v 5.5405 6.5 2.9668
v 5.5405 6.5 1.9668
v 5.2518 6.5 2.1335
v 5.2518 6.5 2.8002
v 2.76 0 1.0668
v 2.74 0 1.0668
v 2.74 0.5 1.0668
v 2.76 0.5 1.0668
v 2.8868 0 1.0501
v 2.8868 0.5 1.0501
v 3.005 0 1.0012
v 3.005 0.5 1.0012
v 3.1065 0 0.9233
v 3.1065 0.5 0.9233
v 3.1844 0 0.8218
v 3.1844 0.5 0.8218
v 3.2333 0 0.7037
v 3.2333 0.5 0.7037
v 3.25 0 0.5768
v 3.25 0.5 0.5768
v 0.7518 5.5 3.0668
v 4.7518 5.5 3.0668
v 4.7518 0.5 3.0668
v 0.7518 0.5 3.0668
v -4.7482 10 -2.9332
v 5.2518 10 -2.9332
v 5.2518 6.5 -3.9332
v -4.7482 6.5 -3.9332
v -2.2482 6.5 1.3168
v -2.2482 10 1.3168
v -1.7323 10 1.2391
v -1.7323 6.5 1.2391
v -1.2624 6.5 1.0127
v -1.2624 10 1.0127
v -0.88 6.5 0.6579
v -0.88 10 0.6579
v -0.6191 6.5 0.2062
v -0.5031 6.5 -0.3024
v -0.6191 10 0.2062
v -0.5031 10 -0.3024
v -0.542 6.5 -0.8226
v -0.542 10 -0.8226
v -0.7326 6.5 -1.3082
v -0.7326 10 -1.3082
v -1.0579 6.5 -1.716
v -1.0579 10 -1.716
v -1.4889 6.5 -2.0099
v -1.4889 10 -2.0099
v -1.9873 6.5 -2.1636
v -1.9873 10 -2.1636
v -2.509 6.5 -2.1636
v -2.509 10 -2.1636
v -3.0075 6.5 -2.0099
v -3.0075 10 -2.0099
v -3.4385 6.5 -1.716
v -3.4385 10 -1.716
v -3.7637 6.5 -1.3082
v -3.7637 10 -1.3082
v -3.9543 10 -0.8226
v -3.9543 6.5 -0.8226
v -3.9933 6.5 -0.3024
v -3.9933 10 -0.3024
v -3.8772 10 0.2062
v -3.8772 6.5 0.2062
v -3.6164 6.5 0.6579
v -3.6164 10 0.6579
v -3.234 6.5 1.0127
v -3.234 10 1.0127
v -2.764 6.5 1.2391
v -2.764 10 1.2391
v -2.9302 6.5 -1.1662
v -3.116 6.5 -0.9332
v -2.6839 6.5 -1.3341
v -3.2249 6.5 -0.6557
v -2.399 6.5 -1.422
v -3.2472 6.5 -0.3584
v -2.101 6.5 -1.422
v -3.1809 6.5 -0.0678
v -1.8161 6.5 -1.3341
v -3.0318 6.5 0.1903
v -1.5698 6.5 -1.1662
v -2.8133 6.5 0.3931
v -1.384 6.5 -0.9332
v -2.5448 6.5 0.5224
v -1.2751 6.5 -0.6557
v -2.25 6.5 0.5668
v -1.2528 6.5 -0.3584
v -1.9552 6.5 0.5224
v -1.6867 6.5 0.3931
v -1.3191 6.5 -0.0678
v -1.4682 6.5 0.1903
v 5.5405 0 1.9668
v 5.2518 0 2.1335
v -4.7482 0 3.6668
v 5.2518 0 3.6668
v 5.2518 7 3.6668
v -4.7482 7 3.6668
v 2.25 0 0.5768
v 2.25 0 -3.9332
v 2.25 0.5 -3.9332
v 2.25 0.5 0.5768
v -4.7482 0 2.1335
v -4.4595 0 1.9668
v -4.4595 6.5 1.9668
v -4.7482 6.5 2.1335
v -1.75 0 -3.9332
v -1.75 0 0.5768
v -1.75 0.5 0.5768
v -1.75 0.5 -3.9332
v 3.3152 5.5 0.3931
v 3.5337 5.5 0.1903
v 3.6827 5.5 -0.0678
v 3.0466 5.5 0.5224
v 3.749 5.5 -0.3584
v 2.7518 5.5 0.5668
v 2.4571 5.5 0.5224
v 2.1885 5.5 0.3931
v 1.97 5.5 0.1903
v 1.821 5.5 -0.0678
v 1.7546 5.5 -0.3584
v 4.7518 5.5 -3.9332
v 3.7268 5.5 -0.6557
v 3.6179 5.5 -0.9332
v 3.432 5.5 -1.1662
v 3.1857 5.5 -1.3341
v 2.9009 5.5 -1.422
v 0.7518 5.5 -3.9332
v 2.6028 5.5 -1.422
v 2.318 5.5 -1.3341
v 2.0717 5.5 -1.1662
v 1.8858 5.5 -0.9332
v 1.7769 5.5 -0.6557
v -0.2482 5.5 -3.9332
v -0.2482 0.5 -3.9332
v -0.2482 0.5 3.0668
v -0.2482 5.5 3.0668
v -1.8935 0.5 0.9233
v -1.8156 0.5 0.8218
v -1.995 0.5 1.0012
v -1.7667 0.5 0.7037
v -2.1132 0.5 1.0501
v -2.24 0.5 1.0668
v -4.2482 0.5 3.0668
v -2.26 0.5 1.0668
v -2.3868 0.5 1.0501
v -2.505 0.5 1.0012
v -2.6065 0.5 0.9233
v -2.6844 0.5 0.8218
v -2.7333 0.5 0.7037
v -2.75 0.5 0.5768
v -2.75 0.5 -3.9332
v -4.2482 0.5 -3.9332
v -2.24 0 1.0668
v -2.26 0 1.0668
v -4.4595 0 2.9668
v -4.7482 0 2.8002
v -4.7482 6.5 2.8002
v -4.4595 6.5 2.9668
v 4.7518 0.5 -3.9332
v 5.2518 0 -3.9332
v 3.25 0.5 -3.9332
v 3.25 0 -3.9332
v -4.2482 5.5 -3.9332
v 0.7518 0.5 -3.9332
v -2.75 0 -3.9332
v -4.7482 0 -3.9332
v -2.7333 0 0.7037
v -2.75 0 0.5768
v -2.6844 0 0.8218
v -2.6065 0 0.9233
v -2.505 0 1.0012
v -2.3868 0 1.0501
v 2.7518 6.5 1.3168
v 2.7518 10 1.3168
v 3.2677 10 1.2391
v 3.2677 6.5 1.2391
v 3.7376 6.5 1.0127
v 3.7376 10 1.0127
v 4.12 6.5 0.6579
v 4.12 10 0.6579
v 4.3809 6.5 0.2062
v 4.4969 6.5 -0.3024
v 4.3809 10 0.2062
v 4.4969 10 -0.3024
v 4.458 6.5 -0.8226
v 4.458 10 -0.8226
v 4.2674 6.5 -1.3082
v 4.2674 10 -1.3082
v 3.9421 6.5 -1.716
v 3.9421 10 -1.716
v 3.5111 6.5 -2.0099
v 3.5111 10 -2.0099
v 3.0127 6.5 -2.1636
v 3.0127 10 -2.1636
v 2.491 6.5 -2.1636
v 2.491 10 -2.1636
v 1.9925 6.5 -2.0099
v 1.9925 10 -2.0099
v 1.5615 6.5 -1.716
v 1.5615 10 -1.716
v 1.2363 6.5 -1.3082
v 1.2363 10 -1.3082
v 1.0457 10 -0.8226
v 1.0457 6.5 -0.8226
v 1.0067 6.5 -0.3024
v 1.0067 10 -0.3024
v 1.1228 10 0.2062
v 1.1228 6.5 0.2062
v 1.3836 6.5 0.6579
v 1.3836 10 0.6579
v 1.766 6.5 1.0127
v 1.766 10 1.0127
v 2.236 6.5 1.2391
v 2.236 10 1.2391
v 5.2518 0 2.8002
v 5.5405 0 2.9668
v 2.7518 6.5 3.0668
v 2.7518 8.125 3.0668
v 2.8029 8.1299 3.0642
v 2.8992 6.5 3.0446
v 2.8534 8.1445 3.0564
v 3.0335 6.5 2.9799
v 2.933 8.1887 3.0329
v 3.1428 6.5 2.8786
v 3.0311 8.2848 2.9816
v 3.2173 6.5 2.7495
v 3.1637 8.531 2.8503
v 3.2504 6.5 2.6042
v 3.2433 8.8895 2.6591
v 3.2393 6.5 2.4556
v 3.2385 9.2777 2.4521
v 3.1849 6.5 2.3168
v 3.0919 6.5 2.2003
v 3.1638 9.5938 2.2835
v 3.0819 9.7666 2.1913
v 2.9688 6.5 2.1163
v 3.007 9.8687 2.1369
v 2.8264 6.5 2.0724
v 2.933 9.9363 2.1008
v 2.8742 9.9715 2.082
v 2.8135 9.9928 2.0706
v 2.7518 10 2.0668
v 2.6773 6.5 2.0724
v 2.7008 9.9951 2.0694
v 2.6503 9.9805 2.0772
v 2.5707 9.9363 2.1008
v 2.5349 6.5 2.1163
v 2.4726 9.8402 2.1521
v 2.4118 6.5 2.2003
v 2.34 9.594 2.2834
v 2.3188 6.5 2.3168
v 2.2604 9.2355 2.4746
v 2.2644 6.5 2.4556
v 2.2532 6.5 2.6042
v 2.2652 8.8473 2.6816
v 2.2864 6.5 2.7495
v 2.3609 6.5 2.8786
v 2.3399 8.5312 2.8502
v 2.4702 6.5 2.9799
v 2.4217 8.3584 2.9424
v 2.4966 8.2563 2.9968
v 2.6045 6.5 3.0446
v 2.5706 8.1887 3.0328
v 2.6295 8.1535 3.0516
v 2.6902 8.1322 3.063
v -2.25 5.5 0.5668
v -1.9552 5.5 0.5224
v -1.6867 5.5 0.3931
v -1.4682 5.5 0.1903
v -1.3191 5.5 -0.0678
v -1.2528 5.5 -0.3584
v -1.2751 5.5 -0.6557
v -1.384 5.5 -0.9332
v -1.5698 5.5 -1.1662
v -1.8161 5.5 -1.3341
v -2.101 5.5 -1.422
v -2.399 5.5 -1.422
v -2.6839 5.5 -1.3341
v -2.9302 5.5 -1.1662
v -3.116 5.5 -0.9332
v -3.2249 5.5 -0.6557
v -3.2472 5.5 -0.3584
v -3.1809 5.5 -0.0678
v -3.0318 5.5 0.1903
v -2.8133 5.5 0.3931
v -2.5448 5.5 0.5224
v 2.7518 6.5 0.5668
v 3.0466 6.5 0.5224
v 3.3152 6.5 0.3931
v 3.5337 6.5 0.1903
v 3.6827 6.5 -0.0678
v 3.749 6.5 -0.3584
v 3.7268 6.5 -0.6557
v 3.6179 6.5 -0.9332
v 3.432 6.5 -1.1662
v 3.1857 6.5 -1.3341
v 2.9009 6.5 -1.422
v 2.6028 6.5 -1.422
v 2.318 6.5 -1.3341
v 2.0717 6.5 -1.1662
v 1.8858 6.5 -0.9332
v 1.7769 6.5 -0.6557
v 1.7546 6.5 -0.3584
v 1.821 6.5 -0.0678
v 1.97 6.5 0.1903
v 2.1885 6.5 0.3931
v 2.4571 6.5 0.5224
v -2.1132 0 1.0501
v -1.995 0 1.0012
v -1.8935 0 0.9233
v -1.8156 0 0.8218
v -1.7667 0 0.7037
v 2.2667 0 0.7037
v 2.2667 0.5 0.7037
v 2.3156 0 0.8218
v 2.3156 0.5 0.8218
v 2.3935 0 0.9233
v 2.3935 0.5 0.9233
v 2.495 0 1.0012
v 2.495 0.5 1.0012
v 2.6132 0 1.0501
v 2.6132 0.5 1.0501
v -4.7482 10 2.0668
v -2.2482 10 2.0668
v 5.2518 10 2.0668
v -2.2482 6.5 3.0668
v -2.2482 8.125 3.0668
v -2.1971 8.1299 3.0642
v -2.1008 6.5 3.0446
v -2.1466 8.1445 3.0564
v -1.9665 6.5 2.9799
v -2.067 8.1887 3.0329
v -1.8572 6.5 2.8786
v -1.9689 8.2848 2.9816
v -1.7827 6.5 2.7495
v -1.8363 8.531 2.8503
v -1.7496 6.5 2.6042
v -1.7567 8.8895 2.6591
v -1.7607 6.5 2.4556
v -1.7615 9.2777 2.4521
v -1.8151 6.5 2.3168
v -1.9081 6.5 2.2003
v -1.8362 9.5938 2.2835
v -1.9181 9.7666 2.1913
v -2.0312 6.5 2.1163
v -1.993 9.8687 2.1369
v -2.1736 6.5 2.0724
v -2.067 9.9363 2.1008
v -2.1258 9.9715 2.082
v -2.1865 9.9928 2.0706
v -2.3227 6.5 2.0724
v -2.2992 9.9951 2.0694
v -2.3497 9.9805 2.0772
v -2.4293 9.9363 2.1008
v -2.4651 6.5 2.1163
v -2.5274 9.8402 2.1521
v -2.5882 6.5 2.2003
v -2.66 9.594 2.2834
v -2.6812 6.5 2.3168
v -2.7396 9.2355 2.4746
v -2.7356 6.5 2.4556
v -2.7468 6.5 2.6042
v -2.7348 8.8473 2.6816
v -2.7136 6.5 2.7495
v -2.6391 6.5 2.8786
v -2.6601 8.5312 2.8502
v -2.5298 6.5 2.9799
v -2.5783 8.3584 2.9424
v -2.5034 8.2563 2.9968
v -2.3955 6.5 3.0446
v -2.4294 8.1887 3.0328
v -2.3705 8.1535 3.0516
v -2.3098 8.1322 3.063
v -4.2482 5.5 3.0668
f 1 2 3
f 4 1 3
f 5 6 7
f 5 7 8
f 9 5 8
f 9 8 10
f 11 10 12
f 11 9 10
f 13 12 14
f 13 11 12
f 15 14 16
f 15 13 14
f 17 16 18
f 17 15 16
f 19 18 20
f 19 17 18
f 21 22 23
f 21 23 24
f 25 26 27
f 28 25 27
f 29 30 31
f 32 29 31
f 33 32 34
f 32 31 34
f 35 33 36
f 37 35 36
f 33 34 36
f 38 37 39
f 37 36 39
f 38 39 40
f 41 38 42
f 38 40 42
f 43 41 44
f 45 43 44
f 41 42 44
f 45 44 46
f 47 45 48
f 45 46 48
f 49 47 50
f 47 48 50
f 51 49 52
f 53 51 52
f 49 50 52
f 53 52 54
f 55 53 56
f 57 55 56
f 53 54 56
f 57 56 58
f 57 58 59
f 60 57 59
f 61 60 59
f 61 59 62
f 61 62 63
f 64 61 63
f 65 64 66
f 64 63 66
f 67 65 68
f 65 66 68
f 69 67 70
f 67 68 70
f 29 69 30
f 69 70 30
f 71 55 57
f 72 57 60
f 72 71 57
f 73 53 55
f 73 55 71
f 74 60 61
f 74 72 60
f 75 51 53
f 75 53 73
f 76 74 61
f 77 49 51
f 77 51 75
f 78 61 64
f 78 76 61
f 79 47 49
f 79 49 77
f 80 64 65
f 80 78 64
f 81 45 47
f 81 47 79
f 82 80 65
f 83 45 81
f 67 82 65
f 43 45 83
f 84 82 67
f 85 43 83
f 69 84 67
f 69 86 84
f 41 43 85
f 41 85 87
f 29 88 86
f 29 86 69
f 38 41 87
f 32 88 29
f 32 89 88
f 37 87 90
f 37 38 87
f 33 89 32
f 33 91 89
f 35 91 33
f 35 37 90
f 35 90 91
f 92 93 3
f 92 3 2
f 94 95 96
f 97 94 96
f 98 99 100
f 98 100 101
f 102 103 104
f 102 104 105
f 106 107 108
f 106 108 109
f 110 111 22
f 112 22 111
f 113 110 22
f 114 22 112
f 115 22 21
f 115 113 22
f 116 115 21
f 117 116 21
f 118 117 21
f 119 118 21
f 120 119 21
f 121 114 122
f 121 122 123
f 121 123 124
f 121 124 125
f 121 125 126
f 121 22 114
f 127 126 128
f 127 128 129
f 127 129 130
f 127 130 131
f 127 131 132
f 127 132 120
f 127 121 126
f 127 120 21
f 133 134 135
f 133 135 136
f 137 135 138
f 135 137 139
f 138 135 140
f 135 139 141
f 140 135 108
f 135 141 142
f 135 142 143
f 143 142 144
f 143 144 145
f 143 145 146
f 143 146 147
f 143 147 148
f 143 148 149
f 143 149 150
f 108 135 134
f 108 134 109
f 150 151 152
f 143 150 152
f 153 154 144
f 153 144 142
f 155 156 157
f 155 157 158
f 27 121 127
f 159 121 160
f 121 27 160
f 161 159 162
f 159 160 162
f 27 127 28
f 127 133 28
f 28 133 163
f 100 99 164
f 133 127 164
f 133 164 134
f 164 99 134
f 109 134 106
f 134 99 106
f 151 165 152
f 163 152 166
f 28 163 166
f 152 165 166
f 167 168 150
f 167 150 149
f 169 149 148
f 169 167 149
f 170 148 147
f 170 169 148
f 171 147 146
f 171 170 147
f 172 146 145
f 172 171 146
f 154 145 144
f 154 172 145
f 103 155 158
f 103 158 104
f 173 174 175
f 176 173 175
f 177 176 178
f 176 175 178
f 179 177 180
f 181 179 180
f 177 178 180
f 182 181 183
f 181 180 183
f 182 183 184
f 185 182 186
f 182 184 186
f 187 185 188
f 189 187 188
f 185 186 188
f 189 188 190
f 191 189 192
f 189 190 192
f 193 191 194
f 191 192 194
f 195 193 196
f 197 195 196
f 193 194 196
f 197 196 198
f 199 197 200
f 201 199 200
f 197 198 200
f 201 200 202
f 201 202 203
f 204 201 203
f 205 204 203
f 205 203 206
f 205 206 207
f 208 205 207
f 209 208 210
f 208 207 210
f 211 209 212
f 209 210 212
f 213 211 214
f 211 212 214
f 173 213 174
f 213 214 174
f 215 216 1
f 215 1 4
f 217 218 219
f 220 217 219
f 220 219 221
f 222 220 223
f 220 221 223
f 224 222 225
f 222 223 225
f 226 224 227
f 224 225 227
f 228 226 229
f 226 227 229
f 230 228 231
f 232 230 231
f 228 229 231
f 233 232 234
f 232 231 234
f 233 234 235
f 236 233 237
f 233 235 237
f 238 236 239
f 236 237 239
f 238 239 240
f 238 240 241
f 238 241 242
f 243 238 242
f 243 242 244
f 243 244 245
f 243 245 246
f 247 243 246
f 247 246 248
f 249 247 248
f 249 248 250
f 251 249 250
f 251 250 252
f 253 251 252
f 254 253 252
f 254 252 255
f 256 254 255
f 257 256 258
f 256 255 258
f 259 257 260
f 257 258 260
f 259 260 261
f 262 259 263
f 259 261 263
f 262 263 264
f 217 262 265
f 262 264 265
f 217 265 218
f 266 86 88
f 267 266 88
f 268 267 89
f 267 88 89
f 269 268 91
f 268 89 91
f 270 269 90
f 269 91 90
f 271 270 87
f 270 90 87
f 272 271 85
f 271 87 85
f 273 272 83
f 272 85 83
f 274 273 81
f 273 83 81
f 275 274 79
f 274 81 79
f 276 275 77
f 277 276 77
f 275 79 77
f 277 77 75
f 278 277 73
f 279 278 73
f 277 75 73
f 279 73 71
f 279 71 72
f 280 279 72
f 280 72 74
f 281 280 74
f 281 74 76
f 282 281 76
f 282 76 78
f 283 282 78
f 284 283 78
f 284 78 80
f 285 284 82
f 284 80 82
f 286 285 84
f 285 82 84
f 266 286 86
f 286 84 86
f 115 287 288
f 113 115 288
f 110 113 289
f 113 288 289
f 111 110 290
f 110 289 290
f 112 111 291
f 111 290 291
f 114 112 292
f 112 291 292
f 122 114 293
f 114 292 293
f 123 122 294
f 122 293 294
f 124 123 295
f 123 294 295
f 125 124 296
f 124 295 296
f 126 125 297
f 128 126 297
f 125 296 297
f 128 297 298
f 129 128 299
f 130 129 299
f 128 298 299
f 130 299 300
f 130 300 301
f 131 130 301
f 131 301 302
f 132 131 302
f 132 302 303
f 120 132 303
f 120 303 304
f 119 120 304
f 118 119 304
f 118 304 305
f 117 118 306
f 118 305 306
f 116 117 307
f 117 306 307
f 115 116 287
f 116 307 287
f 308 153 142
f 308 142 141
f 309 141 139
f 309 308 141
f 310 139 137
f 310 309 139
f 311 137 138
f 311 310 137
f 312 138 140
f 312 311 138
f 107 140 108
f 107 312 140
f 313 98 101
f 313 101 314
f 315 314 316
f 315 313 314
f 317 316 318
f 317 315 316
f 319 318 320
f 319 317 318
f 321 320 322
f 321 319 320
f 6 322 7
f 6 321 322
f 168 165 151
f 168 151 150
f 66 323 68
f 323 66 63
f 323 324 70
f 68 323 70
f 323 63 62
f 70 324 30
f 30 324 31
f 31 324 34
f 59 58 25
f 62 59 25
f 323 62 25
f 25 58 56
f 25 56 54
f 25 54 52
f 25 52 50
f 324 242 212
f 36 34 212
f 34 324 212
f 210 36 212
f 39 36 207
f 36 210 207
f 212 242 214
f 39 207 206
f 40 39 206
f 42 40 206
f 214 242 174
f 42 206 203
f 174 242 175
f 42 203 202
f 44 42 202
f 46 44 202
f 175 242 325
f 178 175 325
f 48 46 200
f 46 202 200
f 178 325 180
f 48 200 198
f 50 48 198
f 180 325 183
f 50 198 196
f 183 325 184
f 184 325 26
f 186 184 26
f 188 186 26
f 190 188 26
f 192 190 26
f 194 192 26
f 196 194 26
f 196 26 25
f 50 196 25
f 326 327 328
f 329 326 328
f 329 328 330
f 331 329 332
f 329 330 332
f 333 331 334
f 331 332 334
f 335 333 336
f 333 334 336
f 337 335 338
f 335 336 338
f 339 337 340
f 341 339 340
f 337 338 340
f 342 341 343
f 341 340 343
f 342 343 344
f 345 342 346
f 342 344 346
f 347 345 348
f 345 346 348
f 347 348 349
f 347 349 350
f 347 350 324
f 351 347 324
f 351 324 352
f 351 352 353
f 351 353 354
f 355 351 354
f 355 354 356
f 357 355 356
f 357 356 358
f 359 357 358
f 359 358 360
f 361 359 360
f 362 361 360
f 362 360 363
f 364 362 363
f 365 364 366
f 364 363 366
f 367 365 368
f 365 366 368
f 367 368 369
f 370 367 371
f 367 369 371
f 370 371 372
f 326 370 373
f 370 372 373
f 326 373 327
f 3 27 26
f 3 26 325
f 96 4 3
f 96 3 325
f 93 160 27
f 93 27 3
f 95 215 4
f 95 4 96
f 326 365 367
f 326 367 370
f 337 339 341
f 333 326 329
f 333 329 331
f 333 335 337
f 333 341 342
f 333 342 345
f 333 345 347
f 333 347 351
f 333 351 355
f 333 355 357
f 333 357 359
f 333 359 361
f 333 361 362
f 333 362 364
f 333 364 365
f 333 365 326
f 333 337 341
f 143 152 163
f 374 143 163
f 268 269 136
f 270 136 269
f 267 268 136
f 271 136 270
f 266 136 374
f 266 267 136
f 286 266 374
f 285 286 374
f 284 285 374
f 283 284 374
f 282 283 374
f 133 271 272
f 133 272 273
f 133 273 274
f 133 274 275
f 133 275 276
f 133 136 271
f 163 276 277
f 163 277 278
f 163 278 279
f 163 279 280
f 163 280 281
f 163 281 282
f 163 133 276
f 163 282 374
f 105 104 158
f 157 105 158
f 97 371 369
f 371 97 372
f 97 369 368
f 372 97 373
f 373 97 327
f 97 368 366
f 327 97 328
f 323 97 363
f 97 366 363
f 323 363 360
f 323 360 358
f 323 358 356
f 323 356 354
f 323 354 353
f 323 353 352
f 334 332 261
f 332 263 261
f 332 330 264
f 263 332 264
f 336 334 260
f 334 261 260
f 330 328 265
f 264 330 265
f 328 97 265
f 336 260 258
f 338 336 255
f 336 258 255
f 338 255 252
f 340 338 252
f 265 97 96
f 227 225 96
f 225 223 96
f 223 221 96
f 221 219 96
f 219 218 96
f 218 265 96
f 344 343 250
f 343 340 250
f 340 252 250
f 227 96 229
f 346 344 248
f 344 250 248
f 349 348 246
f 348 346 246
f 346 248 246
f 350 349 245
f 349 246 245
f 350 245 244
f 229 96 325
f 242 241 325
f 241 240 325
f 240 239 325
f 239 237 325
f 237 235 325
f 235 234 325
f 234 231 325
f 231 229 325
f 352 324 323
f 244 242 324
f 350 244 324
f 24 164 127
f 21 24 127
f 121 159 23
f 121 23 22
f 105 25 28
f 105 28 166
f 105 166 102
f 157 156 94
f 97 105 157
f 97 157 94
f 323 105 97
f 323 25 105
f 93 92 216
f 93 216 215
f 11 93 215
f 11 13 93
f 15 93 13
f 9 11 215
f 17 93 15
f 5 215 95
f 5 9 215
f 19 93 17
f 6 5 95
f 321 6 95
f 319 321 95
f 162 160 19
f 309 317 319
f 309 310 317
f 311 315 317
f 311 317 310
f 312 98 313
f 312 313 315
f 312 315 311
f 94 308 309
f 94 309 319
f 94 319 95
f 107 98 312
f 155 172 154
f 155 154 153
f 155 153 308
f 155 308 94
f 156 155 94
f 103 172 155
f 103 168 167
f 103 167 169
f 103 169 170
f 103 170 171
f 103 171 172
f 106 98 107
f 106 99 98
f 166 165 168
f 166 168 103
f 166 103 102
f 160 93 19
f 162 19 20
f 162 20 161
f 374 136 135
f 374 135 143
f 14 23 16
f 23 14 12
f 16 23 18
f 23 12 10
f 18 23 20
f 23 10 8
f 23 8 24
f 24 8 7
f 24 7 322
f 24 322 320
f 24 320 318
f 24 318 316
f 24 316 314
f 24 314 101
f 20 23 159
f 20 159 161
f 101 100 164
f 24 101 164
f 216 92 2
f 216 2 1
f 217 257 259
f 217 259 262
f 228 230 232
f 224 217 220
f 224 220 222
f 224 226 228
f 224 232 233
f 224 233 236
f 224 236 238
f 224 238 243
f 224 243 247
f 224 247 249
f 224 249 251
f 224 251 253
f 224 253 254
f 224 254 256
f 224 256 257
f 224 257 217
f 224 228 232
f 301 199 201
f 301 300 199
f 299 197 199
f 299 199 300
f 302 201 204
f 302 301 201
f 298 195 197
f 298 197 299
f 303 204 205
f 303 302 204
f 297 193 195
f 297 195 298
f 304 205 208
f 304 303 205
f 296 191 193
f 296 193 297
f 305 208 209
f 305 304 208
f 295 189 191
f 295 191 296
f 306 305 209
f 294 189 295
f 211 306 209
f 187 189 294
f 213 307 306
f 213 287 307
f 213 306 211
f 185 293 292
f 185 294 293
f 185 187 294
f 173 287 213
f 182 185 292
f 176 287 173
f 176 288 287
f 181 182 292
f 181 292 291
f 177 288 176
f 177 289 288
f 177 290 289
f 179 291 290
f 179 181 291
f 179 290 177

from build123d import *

# Parameters (mm, degrees)
BOSS_EXTRUDE1_DEPTH = 6.5
SKETCH2_W           = 4
SKETCH2_H           = 5
CUT_EXTRUDE1_DEPTH  = 7
CUT_EXTRUDE2_DEPTH  = 0.5
BOSS_EXTRUDE2_DEPTH = 10
SKETCH5_R           = 1.75
SKETCH5_R_2         = 0.5
CUT_EXTRUDE3_DEPTH  = 3.5
SKETCH7_R           = 1
CUT_EXTRUDE4_DEPTH  = 1


with BuildPart() as part:
    # Sketch1 → Boss-Extrude1 (new body)
    with BuildSketch(Plane(origin=(0, 0, 0), x_dir=(1, 0, 0), z_dir=(0, 1, 0))):
        Polygon((-4.748160816, 3.12599073), (-4.748160816, 3.933170407), (5.060522517, 3.933170407), (5.251839184, 3.933170407), (5.251839184, 2.992820323), (5.251839184, 1.607179677), (5.251839184, -2.13349626), (5.540514319, -1.966829593), (5.540514319, -2.966829593), (5.251839184, -2.800162927), (5.251839184, -3.666829593), (-4.748160816, -3.666829593), (-4.748160816, -2.800162927), (-4.459485681, -2.966829593), (-4.459485681, -1.966829593), (-4.748160816, -2.13349626), (-4.748160816, 1.740350084), align=None)
    extrude(amount=BOSS_EXTRUDE1_DEPTH)

    # Sketch2 → Cut-Extrude1 (cut)
    with BuildSketch(Plane(origin=(0, 0, -3.933170407), x_dir=(-1, 0, 0), z_dir=(0, 0, -1))):
        with Locations((-2.751839184, 3)):
            Rectangle(SKETCH2_W, SKETCH2_H)
        with Locations((2.248160816, 3)):
            Rectangle(SKETCH2_W, SKETCH2_H)
    extrude(amount=-CUT_EXTRUDE1_DEPTH, mode=Mode.SUBTRACT)

    # Sketch3 → Cut-Extrude2 (cut)
    with BuildSketch(Plane(origin=(0, 0, 0), x_dir=(-1, 0, 0), z_dir=(0, -1, 0))):
        with BuildLine():
            Line((-3.25, 3.933170407), (-2.25, 3.933170407))
            Line((-2.25, 3.933170407), (-2.25, -0.576829593))
            ThreePointArc((-2.25, -0.576829593), (-2.393517677, -0.923311916), (-2.74, -1.066829593))
            Line((-2.74, -1.066829593), (-2.76, -1.066829593))
            ThreePointArc((-2.76, -1.066829593), (-3.106482323, -0.923311916), (-3.25, -0.576829593))
            Line((-3.25, -0.576829593), (-3.25, 3.933170407))
        make_face()
        with BuildLine():
            Line((1.75, 3.933170407), (2.75, 3.933170407))
            Line((2.75, 3.933170407), (2.75, -0.576829593))
            ThreePointArc((2.75, -0.576829593), (2.606482323, -0.923311916), (2.26, -1.066829593))
            Line((2.26, -1.066829593), (2.24, -1.066829593))
            ThreePointArc((2.24, -1.066829593), (1.893517677, -0.923311916), (1.75, -0.576829593))
            Line((1.75, -0.576829593), (1.75, 3.933170407))
        make_face()
    extrude(amount=-CUT_EXTRUDE2_DEPTH, mode=Mode.SUBTRACT)

    # Sketch4 → Boss-Extrude2 (add)
    with BuildSketch(Plane(origin=(5.251839184, 0, 0), x_dir=(0, 0, -1), z_dir=(1, 0, 0))):
        Polygon((3.933170407, 6.5), (-3.666829593, 6.5), (-3.666829593, 7), (-2.066829593, 10), (2.933170407, 10), align=None)
    extrude(amount=-BOSS_EXTRUDE2_DEPTH)

    # Sketch5 → Cut-Extrude3 (cut)
    with BuildSketch(Plane(origin=(0, 10, 0), x_dir=(1, 0, 0), z_dir=(0, 1, 0))):
        with Locations(Location((-2.248160816, 0.433170407, 0), (0, 0, 270))):
            Circle(SKETCH5_R)
        with Locations(Location((2.751839184, 0.433170407, 0), (0, 0, 270))):
            Circle(SKETCH5_R)
        with Locations(Location((-2.248160816, -2.566829593, 0), (0, 0, 270))):
            Circle(SKETCH5_R_2)
        with Locations(Location((2.751839184, -2.566829593, 0), (0, 0, 270))):
            Circle(SKETCH5_R_2)
    extrude(amount=-CUT_EXTRUDE3_DEPTH, mode=Mode.SUBTRACT)

    # Sketch7 → Cut-Extrude4 (cut)
    with BuildSketch(Plane(origin=(0, 6.5, 0), x_dir=(1, 0, 0), z_dir=(0, 1, 0))):
        with Locations(Location((-2.25, 0.433170407, 0), (0, 0, 270))):
            Circle(SKETCH7_R)
        with Locations(Location((2.751839184, 0.433170407, 0), (0, 0, 270))):
            Circle(SKETCH7_R)
    extrude(amount=-CUT_EXTRUDE4_DEPTH, mode=Mode.SUBTRACT)


solid = part.part
